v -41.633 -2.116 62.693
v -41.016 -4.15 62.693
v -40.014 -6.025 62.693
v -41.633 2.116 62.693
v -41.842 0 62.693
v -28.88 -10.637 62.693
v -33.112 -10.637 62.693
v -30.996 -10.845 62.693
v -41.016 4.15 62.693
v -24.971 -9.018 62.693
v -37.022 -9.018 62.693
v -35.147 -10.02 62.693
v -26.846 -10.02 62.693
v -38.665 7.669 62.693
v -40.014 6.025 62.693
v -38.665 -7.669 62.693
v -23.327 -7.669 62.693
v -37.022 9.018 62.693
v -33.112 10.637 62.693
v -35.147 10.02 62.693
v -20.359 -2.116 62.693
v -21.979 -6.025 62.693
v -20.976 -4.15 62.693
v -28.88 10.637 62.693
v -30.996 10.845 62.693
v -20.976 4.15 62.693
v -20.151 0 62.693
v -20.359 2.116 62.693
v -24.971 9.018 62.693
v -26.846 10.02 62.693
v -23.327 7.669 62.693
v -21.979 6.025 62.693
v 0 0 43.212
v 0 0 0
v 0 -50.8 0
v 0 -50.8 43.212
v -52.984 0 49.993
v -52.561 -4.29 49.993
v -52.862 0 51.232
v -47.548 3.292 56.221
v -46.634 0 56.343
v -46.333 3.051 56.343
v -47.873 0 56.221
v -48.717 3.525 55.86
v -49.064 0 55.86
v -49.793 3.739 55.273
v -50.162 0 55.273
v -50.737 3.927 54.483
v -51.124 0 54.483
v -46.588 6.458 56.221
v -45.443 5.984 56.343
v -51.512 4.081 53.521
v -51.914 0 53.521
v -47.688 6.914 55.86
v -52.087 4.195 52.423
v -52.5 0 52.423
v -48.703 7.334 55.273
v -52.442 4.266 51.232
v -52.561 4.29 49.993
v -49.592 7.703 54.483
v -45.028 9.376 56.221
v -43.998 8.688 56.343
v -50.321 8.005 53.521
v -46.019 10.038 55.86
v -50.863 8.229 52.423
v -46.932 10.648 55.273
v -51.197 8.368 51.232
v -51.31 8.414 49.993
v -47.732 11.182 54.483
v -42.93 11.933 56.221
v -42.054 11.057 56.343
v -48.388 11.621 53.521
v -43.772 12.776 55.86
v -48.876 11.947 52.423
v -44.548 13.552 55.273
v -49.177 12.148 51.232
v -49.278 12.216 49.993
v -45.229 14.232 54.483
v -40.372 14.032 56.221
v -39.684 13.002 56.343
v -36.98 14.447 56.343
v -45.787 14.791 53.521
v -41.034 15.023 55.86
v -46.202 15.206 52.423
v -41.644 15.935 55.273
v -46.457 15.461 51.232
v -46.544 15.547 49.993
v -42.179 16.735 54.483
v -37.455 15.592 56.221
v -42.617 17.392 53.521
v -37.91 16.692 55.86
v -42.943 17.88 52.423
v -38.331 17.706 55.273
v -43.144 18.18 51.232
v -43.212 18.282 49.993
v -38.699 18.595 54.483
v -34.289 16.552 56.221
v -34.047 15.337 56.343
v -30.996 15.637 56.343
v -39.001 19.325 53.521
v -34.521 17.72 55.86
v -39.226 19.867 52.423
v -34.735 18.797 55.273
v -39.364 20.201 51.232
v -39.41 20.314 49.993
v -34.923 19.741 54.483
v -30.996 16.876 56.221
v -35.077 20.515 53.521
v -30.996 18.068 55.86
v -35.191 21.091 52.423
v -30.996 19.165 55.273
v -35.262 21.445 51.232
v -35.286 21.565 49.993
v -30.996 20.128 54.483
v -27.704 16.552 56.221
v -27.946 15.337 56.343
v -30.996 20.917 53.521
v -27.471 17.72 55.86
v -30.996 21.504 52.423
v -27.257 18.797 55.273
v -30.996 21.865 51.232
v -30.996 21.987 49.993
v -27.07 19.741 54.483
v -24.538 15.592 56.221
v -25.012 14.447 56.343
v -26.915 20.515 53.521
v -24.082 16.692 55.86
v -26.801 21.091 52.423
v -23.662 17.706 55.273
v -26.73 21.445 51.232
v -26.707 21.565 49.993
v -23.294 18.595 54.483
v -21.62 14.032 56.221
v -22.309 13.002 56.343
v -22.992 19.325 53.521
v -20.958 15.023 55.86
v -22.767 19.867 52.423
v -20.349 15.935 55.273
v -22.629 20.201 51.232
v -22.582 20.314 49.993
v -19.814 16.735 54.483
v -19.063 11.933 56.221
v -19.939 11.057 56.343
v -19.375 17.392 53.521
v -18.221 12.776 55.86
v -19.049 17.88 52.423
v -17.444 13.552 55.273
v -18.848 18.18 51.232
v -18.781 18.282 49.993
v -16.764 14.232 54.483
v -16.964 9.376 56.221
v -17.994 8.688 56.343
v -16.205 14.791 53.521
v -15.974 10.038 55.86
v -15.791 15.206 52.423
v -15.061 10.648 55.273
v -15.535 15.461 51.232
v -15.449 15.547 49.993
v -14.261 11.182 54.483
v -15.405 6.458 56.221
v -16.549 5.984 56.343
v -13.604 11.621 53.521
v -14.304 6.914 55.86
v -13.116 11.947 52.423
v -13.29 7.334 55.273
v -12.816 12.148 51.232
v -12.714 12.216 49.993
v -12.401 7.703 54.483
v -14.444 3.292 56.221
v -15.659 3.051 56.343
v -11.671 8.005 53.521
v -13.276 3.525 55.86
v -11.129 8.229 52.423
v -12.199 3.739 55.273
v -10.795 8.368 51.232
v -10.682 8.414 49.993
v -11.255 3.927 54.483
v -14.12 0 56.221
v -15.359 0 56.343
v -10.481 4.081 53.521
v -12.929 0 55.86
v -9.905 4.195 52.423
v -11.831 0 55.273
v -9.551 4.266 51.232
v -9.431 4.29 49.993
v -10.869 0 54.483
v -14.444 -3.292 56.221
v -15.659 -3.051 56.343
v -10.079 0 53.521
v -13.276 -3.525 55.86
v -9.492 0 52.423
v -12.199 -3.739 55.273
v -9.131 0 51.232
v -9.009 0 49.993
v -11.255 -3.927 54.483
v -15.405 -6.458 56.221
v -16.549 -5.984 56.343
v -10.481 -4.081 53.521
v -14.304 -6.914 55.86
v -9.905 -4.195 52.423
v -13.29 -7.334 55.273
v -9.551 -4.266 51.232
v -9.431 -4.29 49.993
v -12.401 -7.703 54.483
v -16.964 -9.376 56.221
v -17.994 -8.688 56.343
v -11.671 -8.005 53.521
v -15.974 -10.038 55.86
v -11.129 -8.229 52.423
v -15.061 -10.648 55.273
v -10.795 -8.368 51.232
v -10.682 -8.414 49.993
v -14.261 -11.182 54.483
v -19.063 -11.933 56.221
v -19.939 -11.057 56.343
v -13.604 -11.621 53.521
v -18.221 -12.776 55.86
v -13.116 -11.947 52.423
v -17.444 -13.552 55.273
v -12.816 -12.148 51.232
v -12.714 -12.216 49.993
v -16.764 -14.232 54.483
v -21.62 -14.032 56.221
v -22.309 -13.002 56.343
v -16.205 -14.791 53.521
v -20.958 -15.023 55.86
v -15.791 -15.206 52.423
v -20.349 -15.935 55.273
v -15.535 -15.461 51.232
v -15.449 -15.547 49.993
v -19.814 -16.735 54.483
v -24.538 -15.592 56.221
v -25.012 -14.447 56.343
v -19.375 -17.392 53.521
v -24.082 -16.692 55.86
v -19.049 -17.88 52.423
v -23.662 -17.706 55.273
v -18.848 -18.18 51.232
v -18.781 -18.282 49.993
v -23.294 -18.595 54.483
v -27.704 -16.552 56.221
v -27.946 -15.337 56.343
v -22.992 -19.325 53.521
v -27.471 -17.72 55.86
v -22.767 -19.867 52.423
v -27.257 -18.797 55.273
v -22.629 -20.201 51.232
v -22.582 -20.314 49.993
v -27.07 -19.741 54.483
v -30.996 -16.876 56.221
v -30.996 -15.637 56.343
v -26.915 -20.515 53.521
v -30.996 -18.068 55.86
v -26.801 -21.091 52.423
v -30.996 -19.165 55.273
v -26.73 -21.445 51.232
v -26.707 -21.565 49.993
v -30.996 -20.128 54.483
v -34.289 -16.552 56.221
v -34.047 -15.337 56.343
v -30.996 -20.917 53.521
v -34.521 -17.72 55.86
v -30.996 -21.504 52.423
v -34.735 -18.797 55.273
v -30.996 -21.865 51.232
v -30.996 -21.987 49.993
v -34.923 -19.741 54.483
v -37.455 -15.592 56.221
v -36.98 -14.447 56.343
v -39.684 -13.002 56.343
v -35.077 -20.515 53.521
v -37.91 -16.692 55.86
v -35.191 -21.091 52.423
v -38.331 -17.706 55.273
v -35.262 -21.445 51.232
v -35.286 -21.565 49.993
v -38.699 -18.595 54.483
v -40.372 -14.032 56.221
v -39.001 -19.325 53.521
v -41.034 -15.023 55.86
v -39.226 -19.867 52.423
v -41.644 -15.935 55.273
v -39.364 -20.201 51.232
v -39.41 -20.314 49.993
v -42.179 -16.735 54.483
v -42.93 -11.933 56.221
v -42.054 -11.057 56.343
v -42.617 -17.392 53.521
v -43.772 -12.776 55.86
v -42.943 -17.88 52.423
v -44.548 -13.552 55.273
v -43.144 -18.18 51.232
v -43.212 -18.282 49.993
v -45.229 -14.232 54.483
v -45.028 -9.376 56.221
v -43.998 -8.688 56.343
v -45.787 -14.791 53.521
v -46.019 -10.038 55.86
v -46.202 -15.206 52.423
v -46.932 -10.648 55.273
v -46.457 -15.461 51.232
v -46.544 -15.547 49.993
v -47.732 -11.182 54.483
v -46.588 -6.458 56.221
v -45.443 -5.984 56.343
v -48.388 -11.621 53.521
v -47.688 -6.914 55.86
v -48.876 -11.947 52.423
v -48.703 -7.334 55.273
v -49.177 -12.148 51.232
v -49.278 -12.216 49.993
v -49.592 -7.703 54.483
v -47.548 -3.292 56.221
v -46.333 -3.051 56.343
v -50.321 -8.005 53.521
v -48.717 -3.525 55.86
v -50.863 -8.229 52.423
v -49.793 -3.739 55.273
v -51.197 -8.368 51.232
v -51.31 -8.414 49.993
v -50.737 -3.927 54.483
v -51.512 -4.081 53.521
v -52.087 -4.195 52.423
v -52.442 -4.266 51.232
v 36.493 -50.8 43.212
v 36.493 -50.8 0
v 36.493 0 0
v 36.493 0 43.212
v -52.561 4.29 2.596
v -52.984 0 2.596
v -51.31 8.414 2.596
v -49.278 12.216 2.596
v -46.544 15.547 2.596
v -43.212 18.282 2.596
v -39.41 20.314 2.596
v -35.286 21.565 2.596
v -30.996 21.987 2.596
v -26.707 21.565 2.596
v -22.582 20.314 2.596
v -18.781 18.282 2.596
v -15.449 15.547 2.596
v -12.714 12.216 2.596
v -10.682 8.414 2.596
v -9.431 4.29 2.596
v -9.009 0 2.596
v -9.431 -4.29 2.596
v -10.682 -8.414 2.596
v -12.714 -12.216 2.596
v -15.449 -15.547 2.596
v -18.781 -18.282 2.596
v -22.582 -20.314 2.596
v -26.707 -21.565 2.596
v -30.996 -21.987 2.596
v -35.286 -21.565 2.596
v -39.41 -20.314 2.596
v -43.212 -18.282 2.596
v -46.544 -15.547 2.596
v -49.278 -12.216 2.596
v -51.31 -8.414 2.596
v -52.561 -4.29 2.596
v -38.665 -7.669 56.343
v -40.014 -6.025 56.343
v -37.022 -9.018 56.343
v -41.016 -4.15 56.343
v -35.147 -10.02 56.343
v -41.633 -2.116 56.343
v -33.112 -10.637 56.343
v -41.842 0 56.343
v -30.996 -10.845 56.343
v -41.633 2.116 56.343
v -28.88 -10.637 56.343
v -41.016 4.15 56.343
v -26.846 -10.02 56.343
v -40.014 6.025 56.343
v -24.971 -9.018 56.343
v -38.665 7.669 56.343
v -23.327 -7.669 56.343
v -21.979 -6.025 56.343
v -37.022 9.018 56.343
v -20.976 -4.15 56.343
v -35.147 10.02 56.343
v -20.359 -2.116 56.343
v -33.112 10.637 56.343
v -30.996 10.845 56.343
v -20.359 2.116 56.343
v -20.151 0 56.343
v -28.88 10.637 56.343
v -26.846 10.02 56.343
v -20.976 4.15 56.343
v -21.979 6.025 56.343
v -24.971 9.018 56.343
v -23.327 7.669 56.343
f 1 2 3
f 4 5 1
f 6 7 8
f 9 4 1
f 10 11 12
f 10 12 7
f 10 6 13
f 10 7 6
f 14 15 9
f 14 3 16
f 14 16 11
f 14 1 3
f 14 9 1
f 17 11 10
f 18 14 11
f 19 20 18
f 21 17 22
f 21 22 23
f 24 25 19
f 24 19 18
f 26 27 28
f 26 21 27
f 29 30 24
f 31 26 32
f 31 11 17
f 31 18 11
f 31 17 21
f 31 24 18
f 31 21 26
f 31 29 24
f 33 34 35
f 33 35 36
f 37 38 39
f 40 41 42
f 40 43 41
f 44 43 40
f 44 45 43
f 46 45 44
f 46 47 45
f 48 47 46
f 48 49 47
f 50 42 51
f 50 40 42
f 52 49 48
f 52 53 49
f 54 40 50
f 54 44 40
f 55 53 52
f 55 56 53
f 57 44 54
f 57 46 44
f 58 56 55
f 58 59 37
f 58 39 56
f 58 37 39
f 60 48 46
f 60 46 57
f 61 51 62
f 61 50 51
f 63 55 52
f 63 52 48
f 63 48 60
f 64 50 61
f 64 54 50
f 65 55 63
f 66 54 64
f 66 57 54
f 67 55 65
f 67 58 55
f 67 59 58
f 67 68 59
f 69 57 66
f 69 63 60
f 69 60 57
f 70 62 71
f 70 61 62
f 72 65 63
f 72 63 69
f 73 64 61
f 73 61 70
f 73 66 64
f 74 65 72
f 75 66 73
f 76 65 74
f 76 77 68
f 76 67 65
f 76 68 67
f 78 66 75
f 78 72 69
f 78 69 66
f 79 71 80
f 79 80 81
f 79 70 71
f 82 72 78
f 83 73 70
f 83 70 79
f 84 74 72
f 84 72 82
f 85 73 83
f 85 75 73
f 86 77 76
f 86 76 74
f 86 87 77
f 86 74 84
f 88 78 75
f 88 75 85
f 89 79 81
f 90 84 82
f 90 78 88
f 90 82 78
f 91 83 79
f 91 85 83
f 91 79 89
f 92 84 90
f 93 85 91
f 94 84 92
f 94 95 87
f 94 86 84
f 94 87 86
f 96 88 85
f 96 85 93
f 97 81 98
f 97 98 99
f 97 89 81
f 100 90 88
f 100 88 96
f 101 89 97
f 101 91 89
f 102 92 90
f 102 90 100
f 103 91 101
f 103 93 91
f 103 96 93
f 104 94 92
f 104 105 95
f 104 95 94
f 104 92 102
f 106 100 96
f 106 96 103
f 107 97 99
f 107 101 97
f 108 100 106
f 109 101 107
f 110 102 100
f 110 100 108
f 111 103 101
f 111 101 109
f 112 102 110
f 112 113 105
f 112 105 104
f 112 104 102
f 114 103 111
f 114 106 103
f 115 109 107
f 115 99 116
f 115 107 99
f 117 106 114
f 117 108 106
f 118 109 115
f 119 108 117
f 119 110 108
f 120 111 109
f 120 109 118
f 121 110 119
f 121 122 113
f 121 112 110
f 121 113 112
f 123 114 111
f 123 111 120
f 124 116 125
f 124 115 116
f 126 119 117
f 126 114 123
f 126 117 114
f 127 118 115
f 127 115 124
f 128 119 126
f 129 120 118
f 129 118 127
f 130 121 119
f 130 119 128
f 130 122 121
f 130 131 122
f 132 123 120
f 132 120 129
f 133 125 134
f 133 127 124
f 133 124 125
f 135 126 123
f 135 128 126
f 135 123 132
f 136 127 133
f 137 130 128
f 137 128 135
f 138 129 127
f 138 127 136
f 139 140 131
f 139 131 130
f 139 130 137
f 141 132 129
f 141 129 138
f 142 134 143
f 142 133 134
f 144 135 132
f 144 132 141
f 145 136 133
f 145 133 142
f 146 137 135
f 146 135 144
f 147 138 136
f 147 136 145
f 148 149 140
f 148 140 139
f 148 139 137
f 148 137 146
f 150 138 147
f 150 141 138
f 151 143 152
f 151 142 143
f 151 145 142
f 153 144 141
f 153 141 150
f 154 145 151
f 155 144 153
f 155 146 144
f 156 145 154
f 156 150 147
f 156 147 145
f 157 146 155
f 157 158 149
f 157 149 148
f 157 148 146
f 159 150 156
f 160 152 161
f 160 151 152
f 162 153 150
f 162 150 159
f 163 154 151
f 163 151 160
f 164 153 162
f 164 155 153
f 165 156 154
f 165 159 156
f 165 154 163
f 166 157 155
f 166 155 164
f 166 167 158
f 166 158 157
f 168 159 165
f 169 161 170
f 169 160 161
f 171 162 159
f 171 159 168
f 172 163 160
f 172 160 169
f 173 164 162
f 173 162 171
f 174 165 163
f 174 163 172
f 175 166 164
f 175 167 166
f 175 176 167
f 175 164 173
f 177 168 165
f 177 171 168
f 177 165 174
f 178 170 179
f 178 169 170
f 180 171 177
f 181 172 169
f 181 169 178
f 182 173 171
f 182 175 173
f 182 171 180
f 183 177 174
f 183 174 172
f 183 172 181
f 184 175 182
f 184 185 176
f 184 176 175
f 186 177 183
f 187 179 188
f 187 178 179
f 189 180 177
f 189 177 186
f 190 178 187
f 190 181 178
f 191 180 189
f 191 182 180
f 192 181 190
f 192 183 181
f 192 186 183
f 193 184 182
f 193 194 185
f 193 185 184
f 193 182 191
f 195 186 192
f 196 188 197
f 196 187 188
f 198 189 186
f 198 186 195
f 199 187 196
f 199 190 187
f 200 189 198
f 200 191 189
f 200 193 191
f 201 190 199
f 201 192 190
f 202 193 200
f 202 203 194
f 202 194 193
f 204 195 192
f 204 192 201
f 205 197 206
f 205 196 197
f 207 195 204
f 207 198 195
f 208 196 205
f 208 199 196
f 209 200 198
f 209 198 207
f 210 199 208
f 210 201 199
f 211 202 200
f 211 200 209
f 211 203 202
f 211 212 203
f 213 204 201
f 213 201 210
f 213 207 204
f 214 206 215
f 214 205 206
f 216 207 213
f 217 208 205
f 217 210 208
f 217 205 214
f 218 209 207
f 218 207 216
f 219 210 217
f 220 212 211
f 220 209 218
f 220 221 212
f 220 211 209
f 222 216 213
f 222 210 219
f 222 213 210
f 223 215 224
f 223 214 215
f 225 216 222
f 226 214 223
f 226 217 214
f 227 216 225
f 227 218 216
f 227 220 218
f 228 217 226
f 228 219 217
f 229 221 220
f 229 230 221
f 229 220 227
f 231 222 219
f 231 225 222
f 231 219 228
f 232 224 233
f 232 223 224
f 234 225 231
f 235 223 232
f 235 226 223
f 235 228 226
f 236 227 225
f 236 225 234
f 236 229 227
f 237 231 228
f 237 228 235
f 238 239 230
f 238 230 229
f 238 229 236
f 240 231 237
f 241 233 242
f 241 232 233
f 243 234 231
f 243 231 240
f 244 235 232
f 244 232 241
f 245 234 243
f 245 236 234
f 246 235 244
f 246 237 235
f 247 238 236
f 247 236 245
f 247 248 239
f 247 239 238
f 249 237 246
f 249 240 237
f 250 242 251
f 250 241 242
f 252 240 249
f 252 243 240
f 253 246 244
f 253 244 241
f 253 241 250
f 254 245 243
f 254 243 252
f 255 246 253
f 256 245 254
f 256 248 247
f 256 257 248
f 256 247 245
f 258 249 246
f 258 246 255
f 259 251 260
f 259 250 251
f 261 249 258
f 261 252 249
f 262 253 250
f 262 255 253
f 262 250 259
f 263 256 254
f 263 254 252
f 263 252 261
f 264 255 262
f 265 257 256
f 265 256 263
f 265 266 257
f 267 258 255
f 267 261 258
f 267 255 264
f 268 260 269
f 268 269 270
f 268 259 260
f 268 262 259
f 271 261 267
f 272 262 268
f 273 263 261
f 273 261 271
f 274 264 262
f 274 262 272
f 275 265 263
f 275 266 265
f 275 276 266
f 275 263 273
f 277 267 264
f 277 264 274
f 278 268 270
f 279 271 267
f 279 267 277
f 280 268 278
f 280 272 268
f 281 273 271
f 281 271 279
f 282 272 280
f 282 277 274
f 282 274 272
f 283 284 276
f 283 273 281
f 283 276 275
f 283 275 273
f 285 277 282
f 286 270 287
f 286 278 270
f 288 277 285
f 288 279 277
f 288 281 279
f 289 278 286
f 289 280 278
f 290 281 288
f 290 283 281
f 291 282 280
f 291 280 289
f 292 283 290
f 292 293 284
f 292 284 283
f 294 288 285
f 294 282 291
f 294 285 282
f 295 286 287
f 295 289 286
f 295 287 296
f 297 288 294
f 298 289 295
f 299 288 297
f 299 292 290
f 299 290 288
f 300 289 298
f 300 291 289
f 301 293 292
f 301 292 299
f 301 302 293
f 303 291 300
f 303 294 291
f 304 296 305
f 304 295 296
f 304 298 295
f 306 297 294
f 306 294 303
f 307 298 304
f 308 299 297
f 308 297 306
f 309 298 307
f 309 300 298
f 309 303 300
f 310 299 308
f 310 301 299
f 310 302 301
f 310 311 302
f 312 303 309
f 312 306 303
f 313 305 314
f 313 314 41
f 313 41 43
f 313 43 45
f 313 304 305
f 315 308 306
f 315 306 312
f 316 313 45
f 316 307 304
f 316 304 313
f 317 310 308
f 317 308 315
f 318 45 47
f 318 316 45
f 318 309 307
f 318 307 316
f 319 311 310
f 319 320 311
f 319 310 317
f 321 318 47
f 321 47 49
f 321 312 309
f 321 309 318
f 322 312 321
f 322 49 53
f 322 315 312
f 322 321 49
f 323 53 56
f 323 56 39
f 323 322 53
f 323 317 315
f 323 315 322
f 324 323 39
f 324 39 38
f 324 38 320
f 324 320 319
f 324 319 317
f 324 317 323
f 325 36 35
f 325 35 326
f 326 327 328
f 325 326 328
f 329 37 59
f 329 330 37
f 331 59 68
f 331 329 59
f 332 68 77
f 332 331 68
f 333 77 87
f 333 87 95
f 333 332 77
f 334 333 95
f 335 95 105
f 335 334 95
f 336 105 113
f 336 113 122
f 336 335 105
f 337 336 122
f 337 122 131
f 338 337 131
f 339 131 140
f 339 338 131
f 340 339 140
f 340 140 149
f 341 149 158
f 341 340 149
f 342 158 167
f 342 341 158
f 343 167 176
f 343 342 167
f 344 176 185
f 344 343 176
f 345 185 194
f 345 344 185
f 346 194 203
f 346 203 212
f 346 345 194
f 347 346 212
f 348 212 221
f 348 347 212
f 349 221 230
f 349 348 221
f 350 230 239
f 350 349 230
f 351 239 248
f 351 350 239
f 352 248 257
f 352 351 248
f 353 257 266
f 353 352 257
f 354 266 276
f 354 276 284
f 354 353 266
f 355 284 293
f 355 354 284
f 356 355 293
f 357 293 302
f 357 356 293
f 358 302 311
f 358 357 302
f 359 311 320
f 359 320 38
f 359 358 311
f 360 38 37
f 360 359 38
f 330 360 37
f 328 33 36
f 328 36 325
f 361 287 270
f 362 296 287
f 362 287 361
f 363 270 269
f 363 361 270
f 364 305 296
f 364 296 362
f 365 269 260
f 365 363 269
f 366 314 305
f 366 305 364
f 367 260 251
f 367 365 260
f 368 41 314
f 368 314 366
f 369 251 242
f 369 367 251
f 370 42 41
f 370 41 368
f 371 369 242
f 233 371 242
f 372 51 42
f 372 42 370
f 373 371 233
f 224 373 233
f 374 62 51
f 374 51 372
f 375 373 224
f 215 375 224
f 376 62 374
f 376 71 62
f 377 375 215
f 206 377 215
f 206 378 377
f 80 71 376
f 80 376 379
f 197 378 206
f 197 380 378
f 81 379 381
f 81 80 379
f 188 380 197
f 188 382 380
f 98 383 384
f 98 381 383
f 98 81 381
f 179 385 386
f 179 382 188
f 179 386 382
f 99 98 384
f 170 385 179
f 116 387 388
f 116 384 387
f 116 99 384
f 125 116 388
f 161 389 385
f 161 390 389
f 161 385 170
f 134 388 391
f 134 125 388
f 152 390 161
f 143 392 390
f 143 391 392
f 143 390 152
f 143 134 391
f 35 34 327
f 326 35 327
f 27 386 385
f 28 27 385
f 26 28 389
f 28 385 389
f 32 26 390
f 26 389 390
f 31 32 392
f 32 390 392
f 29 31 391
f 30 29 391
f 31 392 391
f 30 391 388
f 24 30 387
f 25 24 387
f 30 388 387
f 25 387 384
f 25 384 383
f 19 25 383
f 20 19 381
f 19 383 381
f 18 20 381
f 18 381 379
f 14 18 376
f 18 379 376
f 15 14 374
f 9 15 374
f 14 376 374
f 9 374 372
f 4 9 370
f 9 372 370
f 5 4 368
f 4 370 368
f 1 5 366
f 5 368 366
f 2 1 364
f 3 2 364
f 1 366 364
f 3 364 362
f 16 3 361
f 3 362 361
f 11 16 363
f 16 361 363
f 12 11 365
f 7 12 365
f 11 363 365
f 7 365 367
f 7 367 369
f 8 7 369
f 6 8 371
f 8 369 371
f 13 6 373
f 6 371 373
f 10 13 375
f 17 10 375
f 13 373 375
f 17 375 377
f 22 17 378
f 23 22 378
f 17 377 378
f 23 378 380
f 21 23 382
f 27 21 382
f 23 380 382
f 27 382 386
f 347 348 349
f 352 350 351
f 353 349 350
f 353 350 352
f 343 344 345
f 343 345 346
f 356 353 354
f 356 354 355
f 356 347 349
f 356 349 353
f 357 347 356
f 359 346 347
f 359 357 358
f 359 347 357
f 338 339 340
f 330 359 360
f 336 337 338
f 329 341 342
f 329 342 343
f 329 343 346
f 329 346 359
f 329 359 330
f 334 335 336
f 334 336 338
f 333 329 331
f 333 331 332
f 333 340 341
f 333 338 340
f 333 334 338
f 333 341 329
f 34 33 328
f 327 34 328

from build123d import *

# Parameters (mm, degrees)
F0_W     = 36.493111
F0_H     = 43.211505
F1_DEPTH = 50.8
F4_R     = 10.845351
F5_DEPTH = 6.35


with BuildPart() as f1:
    # F0 (on Front) → F1 (new body)
    with BuildSketch(Plane.XZ):
        with Locations((18.246555, 21.605752)):
            Rectangle(F0_W, F0_H)
    extrude(amount=F1_DEPTH)


with BuildPart() as f3:
    # F2 (on Front) → F3 (revolve)
    with BuildSketch(Plane.XZ):
        with BuildLine():
            Line((-30.996241, 56.342922), (-46.633724, 56.342922))
            ThreePointArc((-46.633724, 56.342922), (-51.123852, 54.48305), (-52.983724, 49.992922))
            Line((-52.983724, 49.992922), (-52.983724, 2.595745))
            Line((-52.983724, 2.595745), (-30.996241, 2.595745))
            Line((-30.996241, 2.595745), (-30.996241, 56.342922))
        make_face()
    revolve(axis=Axis((-30.996241, 0, 29.469334), (0, 0, -1)))

    # F4 (on face) → F5 (join)
    with BuildSketch(Plane.XY.offset(56.342922)):
        with Locations((-30.996241, 0)):
            Circle(F4_R)
    extrude(amount=F5_DEPTH)


solid = Compound([f1.part, f3.part])
